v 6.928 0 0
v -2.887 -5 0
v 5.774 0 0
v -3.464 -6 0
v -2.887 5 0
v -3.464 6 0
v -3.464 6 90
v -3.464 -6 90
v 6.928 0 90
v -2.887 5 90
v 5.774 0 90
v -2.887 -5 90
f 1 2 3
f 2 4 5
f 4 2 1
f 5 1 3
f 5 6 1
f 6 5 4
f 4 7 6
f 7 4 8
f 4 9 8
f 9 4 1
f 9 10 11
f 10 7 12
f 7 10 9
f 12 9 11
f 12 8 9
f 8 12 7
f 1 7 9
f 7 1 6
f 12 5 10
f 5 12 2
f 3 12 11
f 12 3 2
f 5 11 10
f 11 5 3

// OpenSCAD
module linearTriangle(sideLength, linearLength) {
  linear_extrude(height = linearLength)
  circle((sideLength / sqrt(3)),$fn=3);
}

module hollowRail(sideLength, linearLength, wallThickness = 2) {
  difference() {
    linearTriangle(sideLength,linearLength);
    translate([0,0,-5])
    linearTriangle(sideLength-wallThickness,linearLength+10);
  }
}

hollowRail(12,90);
